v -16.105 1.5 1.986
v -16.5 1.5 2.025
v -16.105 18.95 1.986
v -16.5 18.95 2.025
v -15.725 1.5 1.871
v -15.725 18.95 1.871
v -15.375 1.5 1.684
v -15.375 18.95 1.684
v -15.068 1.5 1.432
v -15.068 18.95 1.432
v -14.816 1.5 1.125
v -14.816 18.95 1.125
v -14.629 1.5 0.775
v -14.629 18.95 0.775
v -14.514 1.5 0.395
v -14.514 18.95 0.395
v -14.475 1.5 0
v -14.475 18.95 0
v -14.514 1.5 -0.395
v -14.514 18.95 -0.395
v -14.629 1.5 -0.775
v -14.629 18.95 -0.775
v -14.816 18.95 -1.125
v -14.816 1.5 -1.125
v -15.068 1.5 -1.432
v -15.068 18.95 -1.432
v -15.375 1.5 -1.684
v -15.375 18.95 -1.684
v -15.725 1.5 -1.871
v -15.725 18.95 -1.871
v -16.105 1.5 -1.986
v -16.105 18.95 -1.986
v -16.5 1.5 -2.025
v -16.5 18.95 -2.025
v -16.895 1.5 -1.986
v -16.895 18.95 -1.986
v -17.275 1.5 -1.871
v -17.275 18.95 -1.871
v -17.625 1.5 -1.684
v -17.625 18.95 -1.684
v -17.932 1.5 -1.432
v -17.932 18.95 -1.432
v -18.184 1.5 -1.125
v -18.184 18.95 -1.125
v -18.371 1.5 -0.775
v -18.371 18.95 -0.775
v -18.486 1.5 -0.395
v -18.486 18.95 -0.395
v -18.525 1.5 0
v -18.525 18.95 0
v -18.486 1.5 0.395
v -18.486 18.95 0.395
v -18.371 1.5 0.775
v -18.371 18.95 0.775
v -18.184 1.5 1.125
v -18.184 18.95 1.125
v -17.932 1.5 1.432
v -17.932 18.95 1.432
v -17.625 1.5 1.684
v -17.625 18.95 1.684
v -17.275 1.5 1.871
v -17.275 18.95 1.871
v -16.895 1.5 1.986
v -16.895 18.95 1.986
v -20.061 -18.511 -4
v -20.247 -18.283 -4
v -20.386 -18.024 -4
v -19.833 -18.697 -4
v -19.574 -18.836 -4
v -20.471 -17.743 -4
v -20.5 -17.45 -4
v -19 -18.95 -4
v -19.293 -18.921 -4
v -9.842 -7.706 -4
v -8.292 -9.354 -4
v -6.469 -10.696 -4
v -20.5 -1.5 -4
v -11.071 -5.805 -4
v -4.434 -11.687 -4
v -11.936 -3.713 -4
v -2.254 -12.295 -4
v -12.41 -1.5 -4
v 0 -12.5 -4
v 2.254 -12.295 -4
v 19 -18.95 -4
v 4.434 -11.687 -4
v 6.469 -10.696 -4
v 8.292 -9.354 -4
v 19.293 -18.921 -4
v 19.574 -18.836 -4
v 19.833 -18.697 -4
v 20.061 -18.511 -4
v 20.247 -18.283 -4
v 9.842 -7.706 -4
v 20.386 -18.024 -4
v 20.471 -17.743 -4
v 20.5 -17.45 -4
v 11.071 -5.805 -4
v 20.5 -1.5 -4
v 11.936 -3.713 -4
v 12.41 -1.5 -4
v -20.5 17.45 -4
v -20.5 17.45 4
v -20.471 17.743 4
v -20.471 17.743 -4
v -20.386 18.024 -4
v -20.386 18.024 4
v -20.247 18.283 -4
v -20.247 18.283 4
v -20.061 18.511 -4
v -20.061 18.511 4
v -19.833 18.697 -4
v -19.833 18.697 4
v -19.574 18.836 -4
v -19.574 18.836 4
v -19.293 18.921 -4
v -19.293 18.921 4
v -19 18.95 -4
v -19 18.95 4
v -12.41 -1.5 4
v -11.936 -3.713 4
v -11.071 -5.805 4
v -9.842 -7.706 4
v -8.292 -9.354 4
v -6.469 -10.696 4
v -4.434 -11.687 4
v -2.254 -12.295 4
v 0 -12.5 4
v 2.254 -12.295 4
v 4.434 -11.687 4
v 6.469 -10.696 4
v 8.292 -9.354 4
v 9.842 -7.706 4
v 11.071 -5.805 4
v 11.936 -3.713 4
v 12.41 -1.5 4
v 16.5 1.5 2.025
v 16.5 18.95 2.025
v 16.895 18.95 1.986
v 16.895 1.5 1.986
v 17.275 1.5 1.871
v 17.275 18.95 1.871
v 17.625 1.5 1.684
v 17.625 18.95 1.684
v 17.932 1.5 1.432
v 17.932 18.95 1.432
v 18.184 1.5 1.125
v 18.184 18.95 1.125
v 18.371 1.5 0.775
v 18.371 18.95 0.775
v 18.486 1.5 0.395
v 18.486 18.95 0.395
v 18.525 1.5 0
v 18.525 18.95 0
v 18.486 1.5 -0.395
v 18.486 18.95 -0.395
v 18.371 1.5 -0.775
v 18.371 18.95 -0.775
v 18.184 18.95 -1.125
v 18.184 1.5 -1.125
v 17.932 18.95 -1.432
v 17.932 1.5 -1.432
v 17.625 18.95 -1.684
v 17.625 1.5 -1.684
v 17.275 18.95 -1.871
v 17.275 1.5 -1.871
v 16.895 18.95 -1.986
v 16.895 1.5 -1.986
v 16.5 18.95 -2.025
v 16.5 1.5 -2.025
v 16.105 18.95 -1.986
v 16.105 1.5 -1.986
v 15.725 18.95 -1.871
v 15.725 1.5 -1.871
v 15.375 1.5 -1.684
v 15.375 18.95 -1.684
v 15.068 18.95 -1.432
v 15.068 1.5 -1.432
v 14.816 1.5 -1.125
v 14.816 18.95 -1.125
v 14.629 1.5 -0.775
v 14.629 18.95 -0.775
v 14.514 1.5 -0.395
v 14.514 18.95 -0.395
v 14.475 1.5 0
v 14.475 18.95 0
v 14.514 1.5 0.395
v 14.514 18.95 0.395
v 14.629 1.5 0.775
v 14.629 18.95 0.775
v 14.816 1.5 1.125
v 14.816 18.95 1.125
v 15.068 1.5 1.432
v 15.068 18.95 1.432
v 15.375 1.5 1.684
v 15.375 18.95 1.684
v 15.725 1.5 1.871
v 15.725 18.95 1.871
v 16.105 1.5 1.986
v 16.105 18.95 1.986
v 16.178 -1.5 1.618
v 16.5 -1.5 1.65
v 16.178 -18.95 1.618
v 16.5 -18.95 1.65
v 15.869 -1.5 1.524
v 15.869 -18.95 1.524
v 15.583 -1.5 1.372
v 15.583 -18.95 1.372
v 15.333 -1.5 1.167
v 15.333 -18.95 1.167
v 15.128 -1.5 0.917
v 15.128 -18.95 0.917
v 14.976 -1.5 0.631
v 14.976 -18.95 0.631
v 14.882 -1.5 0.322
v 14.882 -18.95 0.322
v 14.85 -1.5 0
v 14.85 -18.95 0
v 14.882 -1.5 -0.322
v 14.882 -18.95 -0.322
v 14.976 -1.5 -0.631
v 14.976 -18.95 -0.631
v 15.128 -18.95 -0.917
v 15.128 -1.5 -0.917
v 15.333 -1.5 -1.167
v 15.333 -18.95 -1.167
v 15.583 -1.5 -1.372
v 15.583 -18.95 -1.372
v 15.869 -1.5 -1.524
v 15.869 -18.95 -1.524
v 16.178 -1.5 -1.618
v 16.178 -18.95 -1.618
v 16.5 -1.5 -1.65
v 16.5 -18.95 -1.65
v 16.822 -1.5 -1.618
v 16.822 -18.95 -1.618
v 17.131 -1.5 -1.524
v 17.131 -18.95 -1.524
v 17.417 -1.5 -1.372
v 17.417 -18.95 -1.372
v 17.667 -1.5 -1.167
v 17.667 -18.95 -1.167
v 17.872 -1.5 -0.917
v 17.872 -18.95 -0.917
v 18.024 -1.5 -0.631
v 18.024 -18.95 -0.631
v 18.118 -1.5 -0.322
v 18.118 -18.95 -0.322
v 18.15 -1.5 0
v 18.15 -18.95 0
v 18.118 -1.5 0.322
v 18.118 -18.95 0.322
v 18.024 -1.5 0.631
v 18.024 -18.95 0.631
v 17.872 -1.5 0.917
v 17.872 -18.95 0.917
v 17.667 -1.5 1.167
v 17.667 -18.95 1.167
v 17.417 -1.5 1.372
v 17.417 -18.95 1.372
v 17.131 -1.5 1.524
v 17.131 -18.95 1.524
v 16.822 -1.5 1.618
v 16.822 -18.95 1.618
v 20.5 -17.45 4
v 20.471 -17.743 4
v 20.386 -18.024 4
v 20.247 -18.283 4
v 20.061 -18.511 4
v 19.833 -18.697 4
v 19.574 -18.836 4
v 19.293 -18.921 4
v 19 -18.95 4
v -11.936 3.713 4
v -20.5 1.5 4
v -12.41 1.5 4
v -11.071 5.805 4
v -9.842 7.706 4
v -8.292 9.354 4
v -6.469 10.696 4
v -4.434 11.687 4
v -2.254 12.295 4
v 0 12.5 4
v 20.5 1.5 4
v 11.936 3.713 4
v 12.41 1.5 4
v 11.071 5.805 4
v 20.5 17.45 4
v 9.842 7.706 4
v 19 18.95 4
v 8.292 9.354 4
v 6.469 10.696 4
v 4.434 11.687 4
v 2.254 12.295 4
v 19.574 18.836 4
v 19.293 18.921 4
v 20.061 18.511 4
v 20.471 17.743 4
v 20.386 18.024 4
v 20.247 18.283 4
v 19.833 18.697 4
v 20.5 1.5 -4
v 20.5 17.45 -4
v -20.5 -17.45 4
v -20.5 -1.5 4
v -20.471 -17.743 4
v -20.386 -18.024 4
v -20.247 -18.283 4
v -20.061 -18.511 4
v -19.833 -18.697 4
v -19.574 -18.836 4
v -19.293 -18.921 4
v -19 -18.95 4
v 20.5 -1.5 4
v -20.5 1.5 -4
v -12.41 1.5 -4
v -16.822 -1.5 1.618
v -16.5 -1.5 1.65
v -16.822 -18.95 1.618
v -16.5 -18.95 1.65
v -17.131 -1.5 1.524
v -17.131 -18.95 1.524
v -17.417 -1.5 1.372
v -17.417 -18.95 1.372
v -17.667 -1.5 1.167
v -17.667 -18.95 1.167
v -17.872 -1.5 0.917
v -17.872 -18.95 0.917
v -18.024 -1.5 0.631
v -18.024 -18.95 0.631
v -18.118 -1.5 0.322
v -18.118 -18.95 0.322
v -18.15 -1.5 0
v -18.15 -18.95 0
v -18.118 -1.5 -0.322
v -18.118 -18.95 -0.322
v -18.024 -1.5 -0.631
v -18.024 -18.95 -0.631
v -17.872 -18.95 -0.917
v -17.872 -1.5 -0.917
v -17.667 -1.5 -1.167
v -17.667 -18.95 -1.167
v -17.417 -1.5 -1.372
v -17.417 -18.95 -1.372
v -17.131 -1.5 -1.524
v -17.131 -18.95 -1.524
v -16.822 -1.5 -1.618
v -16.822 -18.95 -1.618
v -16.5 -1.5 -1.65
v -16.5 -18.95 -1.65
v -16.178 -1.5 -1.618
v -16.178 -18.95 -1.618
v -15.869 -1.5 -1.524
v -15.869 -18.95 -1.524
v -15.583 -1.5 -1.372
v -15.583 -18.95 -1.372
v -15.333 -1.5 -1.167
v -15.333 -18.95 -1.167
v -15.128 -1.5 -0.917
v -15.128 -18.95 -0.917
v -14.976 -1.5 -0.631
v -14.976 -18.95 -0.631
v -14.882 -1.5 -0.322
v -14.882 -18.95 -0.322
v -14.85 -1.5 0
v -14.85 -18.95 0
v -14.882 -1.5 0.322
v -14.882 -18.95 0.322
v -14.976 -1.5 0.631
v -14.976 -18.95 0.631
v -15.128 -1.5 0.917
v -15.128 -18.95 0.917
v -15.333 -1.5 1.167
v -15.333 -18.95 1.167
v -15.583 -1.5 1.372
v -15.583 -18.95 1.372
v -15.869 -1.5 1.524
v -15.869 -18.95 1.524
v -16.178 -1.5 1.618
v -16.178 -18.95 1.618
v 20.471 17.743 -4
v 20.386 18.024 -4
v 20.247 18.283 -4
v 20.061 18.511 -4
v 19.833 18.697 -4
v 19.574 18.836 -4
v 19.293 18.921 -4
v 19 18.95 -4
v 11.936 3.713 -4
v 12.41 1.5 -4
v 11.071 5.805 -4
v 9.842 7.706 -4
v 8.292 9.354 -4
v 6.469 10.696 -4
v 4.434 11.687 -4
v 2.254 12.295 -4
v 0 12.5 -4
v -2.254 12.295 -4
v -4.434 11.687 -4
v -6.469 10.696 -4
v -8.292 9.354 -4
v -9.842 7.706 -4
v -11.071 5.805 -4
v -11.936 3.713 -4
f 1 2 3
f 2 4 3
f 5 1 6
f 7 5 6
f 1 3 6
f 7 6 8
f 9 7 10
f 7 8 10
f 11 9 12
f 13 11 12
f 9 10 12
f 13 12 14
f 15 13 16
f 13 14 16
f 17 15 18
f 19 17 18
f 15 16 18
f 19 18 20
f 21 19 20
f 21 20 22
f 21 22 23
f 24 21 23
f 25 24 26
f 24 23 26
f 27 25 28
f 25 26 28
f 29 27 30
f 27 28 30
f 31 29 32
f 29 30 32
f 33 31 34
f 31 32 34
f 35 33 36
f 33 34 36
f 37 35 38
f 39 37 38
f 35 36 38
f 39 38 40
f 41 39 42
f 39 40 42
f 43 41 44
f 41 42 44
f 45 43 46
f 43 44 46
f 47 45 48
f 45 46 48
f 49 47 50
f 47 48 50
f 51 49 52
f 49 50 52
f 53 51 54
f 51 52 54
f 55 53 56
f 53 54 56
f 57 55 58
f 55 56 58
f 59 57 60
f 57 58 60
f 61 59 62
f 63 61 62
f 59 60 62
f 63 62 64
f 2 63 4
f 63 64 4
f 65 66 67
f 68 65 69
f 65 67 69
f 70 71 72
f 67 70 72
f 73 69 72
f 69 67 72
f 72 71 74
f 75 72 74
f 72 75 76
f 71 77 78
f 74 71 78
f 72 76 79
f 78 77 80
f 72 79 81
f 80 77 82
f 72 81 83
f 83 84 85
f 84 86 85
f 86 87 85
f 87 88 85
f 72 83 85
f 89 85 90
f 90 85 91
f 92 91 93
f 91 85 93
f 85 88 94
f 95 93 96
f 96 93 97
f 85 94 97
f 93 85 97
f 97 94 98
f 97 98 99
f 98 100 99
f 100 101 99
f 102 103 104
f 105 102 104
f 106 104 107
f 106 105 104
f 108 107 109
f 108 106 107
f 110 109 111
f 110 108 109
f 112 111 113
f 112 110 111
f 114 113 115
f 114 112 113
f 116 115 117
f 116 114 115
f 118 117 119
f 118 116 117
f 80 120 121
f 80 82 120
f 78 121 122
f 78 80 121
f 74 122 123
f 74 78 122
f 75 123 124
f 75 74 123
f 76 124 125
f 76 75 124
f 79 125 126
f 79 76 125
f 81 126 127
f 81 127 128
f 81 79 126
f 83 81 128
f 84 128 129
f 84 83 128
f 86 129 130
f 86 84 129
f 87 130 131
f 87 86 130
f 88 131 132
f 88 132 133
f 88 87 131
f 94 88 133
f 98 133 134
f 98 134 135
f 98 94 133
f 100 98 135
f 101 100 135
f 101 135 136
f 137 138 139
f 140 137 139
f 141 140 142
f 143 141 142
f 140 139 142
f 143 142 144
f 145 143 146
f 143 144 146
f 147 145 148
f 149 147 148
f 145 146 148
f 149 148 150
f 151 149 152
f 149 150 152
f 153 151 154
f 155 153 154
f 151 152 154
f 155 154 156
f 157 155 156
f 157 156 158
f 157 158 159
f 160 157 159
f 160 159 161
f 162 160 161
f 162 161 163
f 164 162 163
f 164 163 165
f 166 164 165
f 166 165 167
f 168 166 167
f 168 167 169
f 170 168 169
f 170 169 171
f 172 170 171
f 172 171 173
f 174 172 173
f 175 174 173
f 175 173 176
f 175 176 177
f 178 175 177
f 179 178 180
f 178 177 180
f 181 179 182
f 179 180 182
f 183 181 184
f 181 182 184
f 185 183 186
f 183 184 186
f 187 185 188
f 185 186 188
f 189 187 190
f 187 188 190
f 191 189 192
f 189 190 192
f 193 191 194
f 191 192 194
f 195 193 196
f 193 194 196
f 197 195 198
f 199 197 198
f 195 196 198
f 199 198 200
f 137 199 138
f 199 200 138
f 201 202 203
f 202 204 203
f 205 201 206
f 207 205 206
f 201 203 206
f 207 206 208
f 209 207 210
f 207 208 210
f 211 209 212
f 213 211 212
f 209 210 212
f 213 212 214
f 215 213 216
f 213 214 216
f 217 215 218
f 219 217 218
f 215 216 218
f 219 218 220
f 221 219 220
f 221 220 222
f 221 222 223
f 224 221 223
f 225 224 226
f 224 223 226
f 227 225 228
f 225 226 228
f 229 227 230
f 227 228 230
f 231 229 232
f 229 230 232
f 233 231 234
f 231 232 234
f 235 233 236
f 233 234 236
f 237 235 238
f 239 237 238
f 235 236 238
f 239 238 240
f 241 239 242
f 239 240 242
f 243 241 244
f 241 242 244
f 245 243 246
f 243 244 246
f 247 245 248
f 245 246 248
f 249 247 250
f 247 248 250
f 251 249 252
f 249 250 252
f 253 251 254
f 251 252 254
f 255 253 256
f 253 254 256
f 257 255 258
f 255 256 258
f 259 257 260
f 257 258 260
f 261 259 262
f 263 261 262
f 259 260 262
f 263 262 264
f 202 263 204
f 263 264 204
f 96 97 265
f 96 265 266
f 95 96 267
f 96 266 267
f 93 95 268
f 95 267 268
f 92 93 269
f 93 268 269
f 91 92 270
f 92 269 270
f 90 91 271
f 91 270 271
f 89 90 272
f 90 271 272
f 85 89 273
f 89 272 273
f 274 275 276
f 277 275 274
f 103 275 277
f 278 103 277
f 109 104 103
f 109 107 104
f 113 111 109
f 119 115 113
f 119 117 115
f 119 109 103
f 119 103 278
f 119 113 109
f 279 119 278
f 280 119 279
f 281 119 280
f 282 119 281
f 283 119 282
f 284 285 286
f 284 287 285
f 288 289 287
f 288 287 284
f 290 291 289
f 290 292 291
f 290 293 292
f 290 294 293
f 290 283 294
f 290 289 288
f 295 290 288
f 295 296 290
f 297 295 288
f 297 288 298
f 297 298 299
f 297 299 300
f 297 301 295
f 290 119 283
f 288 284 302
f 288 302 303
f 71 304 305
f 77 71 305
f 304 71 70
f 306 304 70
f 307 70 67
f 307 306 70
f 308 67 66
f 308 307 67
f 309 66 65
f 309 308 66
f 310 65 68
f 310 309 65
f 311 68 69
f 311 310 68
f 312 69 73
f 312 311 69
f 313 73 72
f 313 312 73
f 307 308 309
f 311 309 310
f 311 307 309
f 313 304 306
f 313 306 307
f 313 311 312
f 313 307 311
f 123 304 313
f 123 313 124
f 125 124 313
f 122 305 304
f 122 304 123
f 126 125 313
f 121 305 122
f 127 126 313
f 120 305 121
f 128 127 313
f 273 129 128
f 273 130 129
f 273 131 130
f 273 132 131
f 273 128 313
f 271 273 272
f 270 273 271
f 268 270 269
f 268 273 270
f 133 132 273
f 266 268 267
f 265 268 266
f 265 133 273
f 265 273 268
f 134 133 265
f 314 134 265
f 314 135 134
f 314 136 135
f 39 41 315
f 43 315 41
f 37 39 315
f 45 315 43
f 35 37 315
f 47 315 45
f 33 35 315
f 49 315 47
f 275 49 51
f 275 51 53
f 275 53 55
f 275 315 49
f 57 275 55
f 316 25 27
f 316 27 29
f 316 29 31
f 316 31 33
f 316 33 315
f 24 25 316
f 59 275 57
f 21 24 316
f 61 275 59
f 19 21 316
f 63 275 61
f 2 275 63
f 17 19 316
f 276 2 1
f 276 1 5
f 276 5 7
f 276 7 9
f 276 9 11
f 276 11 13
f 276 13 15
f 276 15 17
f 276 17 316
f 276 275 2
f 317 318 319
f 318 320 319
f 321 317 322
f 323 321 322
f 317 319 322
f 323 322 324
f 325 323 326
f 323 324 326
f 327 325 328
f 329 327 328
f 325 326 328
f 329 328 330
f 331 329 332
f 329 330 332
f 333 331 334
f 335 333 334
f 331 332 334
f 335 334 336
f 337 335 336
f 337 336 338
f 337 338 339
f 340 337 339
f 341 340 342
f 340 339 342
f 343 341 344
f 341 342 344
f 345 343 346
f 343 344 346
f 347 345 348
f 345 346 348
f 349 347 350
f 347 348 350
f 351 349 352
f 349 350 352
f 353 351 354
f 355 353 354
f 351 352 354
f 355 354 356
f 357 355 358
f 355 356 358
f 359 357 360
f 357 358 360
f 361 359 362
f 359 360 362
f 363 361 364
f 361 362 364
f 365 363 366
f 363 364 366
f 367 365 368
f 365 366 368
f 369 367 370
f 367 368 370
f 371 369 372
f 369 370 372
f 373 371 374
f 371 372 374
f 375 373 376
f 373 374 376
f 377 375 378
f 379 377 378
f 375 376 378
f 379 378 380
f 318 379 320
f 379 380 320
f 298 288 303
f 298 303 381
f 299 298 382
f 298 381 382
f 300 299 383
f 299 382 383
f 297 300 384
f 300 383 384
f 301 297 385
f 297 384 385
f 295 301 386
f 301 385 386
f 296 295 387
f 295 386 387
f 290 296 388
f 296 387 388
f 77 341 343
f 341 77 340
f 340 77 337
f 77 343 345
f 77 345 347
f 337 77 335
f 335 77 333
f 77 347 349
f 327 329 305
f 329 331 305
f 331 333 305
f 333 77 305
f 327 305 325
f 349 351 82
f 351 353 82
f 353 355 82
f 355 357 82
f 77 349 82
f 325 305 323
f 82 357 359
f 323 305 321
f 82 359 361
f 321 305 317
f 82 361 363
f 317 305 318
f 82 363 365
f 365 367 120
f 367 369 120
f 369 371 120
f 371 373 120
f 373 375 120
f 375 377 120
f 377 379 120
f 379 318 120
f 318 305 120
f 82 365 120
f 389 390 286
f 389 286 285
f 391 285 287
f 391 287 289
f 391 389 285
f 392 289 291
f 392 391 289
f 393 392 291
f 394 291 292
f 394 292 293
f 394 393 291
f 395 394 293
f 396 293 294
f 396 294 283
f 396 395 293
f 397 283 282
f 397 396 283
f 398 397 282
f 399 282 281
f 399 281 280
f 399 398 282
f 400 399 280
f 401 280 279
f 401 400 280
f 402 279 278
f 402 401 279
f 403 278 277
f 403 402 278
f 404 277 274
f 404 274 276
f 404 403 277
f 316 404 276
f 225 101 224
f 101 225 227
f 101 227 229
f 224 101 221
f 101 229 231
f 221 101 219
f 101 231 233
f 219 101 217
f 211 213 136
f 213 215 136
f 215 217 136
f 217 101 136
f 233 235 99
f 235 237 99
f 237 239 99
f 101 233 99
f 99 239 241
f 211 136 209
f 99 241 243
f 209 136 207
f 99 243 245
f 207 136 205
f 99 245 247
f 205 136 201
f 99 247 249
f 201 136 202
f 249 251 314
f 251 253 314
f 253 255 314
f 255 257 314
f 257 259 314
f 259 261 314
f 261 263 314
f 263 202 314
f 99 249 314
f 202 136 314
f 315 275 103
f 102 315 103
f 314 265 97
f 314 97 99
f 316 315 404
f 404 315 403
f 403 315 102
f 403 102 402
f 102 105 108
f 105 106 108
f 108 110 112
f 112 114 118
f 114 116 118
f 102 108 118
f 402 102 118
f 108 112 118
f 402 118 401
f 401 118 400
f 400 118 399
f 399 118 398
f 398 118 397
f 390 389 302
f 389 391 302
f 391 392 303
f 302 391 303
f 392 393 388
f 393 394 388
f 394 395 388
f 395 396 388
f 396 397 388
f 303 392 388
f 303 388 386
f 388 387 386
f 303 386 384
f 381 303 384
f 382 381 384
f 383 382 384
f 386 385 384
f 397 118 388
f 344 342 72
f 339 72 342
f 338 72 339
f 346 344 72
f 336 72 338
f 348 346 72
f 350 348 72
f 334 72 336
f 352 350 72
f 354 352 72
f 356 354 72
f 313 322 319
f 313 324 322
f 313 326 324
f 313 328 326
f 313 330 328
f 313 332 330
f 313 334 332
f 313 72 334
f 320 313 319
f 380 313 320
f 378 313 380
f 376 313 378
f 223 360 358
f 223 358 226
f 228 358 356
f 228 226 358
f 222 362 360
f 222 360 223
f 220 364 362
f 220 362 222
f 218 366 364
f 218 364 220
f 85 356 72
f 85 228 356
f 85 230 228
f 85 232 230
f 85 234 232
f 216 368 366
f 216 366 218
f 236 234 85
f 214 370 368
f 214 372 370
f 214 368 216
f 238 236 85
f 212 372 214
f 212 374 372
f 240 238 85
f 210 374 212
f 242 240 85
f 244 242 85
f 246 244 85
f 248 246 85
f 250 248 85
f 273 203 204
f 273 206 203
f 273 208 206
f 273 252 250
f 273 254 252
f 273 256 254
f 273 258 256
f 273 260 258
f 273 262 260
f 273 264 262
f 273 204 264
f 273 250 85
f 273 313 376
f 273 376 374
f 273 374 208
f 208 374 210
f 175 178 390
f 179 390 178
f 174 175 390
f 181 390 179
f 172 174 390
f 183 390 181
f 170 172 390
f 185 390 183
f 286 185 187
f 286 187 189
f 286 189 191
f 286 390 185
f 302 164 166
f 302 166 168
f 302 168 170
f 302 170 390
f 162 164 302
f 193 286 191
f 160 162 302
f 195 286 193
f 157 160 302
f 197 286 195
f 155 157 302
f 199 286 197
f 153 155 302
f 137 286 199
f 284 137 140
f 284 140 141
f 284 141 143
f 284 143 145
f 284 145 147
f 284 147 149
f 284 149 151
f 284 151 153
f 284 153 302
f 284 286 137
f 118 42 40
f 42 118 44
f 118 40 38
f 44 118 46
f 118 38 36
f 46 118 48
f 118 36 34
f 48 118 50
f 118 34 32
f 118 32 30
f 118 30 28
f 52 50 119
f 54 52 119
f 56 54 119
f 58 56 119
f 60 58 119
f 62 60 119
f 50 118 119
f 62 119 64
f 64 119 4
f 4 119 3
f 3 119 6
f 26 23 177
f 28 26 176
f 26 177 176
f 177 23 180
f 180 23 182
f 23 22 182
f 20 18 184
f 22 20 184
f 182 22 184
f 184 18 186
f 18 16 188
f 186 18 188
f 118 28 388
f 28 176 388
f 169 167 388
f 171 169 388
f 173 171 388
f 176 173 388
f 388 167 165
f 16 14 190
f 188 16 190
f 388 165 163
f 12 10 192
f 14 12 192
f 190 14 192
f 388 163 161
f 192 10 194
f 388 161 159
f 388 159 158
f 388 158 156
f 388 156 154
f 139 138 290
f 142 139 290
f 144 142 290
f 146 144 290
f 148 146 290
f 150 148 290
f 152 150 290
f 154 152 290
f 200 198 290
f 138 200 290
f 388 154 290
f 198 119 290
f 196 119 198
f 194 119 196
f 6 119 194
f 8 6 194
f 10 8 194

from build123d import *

# Parameters (mm, degrees)
SKETCH_1_W                  = 41
SKETCH_1_H                  = 37.9
SKETCH_1_R                  = 12.5
EXTRUDE_1_DEPTH             = 4
FILLET_1_R                  = 1.5
SKETCH_2_W                  = 50
SKETCH_2_H                  = 3
CUT_EXTRUDE_1_DEPTH         = 19
SKETCH_3_R                  = 2.025
CUT_EXTRUDE_2_DEPTH         = 19
SKETCH_5_W                  = 1.65
SKETCH_5_H                  = 17.45
HOLE_WIZARD_M4_1_AT_2_COUNT = 2
HOLE_WIZARD_M4_1_AT_2_PITCH = 33


with BuildPart() as part:
    # 草图1 → 凸台-拉伸1 (new, symmetric)
    with BuildSketch(Plane.XY):
        Rectangle(SKETCH_1_W, SKETCH_1_H)
        Circle(SKETCH_1_R, mode=Mode.SUBTRACT)
    extrude(amount=EXTRUDE_1_DEPTH, both=True)

    # 圆角1
    fillet_1_edges = [part.edges().sort_by_distance(p)[0] for p in [
        (20.5, -18.95, 0),
        (-20.5, -18.95, 0),
        (-20.5, 18.95, 0),
        (20.5, 18.95, 0),
    ]]
    fillet(fillet_1_edges, radius=FILLET_1_R)

    # 草图2 → 切除-拉伸1 (cut, symmetric)
    with BuildSketch(Plane.XY.offset(4)):
        Rectangle(SKETCH_2_W, SKETCH_2_H)
    extrude(amount=CUT_EXTRUDE_1_DEPTH, both=True, mode=Mode.SUBTRACT)


with BuildPart() as cut_extrude_1_piece_1:
    # of the separate pieces the step leaves, piece 1, a body of its own (cut_extrude_1_pieces)
    add(part.part.solids().sort_by_distance((-19, -18.95, -4))[0])

    # 草图5 → M4 螺纹孔1 (revolve, cut)
    with BuildSketch(Plane(origin=(-16.5, -1.5, 0), x_dir=(0, 0, 1), z_dir=(1, 0, 0))):
        with Locations((0.825, 8.725)):
            Rectangle(SKETCH_5_W, SKETCH_5_H)
    hole_wizard_m4_1 = revolve(axis=Axis((-16.5, 4.85, 0), (0, -1, 0)), mode=Mode.SUBTRACT)

    # M4 螺纹孔1 at 2: M4 螺纹孔1 ×2
    with Locations(*[(i * HOLE_WIZARD_M4_1_AT_2_PITCH, 0, 0) for i in range(1, HOLE_WIZARD_M4_1_AT_2_COUNT)]):
        add(hole_wizard_m4_1, mode=Mode.SUBTRACT)


with BuildPart() as cut_extrude_1_piece_2:
    # of the separate pieces the step leaves, piece 2, a body of its own (cut_extrude_1_pieces)
    add(part.part.solids().sort_by_distance((-20.5, 17.45, -4))[0])

    # 草图3 → 切除-拉伸2 (cut, symmetric)
    with BuildSketch(Plane(origin=(0, 18.95, 0), x_dir=(1, 0, 0), z_dir=(0, 1, 0))):
        with Locations(Location((16.5, 0, 0), (0, 0, 270))):
            Circle(SKETCH_3_R)
        with Locations(Location((-16.5, 0, 0), (0, 0, 270))):
            Circle(SKETCH_3_R)
    extrude(amount=CUT_EXTRUDE_2_DEPTH, both=True, mode=Mode.SUBTRACT)


solid = Compound([cut_extrude_1_piece_1.part, cut_extrude_1_piece_2.part])
